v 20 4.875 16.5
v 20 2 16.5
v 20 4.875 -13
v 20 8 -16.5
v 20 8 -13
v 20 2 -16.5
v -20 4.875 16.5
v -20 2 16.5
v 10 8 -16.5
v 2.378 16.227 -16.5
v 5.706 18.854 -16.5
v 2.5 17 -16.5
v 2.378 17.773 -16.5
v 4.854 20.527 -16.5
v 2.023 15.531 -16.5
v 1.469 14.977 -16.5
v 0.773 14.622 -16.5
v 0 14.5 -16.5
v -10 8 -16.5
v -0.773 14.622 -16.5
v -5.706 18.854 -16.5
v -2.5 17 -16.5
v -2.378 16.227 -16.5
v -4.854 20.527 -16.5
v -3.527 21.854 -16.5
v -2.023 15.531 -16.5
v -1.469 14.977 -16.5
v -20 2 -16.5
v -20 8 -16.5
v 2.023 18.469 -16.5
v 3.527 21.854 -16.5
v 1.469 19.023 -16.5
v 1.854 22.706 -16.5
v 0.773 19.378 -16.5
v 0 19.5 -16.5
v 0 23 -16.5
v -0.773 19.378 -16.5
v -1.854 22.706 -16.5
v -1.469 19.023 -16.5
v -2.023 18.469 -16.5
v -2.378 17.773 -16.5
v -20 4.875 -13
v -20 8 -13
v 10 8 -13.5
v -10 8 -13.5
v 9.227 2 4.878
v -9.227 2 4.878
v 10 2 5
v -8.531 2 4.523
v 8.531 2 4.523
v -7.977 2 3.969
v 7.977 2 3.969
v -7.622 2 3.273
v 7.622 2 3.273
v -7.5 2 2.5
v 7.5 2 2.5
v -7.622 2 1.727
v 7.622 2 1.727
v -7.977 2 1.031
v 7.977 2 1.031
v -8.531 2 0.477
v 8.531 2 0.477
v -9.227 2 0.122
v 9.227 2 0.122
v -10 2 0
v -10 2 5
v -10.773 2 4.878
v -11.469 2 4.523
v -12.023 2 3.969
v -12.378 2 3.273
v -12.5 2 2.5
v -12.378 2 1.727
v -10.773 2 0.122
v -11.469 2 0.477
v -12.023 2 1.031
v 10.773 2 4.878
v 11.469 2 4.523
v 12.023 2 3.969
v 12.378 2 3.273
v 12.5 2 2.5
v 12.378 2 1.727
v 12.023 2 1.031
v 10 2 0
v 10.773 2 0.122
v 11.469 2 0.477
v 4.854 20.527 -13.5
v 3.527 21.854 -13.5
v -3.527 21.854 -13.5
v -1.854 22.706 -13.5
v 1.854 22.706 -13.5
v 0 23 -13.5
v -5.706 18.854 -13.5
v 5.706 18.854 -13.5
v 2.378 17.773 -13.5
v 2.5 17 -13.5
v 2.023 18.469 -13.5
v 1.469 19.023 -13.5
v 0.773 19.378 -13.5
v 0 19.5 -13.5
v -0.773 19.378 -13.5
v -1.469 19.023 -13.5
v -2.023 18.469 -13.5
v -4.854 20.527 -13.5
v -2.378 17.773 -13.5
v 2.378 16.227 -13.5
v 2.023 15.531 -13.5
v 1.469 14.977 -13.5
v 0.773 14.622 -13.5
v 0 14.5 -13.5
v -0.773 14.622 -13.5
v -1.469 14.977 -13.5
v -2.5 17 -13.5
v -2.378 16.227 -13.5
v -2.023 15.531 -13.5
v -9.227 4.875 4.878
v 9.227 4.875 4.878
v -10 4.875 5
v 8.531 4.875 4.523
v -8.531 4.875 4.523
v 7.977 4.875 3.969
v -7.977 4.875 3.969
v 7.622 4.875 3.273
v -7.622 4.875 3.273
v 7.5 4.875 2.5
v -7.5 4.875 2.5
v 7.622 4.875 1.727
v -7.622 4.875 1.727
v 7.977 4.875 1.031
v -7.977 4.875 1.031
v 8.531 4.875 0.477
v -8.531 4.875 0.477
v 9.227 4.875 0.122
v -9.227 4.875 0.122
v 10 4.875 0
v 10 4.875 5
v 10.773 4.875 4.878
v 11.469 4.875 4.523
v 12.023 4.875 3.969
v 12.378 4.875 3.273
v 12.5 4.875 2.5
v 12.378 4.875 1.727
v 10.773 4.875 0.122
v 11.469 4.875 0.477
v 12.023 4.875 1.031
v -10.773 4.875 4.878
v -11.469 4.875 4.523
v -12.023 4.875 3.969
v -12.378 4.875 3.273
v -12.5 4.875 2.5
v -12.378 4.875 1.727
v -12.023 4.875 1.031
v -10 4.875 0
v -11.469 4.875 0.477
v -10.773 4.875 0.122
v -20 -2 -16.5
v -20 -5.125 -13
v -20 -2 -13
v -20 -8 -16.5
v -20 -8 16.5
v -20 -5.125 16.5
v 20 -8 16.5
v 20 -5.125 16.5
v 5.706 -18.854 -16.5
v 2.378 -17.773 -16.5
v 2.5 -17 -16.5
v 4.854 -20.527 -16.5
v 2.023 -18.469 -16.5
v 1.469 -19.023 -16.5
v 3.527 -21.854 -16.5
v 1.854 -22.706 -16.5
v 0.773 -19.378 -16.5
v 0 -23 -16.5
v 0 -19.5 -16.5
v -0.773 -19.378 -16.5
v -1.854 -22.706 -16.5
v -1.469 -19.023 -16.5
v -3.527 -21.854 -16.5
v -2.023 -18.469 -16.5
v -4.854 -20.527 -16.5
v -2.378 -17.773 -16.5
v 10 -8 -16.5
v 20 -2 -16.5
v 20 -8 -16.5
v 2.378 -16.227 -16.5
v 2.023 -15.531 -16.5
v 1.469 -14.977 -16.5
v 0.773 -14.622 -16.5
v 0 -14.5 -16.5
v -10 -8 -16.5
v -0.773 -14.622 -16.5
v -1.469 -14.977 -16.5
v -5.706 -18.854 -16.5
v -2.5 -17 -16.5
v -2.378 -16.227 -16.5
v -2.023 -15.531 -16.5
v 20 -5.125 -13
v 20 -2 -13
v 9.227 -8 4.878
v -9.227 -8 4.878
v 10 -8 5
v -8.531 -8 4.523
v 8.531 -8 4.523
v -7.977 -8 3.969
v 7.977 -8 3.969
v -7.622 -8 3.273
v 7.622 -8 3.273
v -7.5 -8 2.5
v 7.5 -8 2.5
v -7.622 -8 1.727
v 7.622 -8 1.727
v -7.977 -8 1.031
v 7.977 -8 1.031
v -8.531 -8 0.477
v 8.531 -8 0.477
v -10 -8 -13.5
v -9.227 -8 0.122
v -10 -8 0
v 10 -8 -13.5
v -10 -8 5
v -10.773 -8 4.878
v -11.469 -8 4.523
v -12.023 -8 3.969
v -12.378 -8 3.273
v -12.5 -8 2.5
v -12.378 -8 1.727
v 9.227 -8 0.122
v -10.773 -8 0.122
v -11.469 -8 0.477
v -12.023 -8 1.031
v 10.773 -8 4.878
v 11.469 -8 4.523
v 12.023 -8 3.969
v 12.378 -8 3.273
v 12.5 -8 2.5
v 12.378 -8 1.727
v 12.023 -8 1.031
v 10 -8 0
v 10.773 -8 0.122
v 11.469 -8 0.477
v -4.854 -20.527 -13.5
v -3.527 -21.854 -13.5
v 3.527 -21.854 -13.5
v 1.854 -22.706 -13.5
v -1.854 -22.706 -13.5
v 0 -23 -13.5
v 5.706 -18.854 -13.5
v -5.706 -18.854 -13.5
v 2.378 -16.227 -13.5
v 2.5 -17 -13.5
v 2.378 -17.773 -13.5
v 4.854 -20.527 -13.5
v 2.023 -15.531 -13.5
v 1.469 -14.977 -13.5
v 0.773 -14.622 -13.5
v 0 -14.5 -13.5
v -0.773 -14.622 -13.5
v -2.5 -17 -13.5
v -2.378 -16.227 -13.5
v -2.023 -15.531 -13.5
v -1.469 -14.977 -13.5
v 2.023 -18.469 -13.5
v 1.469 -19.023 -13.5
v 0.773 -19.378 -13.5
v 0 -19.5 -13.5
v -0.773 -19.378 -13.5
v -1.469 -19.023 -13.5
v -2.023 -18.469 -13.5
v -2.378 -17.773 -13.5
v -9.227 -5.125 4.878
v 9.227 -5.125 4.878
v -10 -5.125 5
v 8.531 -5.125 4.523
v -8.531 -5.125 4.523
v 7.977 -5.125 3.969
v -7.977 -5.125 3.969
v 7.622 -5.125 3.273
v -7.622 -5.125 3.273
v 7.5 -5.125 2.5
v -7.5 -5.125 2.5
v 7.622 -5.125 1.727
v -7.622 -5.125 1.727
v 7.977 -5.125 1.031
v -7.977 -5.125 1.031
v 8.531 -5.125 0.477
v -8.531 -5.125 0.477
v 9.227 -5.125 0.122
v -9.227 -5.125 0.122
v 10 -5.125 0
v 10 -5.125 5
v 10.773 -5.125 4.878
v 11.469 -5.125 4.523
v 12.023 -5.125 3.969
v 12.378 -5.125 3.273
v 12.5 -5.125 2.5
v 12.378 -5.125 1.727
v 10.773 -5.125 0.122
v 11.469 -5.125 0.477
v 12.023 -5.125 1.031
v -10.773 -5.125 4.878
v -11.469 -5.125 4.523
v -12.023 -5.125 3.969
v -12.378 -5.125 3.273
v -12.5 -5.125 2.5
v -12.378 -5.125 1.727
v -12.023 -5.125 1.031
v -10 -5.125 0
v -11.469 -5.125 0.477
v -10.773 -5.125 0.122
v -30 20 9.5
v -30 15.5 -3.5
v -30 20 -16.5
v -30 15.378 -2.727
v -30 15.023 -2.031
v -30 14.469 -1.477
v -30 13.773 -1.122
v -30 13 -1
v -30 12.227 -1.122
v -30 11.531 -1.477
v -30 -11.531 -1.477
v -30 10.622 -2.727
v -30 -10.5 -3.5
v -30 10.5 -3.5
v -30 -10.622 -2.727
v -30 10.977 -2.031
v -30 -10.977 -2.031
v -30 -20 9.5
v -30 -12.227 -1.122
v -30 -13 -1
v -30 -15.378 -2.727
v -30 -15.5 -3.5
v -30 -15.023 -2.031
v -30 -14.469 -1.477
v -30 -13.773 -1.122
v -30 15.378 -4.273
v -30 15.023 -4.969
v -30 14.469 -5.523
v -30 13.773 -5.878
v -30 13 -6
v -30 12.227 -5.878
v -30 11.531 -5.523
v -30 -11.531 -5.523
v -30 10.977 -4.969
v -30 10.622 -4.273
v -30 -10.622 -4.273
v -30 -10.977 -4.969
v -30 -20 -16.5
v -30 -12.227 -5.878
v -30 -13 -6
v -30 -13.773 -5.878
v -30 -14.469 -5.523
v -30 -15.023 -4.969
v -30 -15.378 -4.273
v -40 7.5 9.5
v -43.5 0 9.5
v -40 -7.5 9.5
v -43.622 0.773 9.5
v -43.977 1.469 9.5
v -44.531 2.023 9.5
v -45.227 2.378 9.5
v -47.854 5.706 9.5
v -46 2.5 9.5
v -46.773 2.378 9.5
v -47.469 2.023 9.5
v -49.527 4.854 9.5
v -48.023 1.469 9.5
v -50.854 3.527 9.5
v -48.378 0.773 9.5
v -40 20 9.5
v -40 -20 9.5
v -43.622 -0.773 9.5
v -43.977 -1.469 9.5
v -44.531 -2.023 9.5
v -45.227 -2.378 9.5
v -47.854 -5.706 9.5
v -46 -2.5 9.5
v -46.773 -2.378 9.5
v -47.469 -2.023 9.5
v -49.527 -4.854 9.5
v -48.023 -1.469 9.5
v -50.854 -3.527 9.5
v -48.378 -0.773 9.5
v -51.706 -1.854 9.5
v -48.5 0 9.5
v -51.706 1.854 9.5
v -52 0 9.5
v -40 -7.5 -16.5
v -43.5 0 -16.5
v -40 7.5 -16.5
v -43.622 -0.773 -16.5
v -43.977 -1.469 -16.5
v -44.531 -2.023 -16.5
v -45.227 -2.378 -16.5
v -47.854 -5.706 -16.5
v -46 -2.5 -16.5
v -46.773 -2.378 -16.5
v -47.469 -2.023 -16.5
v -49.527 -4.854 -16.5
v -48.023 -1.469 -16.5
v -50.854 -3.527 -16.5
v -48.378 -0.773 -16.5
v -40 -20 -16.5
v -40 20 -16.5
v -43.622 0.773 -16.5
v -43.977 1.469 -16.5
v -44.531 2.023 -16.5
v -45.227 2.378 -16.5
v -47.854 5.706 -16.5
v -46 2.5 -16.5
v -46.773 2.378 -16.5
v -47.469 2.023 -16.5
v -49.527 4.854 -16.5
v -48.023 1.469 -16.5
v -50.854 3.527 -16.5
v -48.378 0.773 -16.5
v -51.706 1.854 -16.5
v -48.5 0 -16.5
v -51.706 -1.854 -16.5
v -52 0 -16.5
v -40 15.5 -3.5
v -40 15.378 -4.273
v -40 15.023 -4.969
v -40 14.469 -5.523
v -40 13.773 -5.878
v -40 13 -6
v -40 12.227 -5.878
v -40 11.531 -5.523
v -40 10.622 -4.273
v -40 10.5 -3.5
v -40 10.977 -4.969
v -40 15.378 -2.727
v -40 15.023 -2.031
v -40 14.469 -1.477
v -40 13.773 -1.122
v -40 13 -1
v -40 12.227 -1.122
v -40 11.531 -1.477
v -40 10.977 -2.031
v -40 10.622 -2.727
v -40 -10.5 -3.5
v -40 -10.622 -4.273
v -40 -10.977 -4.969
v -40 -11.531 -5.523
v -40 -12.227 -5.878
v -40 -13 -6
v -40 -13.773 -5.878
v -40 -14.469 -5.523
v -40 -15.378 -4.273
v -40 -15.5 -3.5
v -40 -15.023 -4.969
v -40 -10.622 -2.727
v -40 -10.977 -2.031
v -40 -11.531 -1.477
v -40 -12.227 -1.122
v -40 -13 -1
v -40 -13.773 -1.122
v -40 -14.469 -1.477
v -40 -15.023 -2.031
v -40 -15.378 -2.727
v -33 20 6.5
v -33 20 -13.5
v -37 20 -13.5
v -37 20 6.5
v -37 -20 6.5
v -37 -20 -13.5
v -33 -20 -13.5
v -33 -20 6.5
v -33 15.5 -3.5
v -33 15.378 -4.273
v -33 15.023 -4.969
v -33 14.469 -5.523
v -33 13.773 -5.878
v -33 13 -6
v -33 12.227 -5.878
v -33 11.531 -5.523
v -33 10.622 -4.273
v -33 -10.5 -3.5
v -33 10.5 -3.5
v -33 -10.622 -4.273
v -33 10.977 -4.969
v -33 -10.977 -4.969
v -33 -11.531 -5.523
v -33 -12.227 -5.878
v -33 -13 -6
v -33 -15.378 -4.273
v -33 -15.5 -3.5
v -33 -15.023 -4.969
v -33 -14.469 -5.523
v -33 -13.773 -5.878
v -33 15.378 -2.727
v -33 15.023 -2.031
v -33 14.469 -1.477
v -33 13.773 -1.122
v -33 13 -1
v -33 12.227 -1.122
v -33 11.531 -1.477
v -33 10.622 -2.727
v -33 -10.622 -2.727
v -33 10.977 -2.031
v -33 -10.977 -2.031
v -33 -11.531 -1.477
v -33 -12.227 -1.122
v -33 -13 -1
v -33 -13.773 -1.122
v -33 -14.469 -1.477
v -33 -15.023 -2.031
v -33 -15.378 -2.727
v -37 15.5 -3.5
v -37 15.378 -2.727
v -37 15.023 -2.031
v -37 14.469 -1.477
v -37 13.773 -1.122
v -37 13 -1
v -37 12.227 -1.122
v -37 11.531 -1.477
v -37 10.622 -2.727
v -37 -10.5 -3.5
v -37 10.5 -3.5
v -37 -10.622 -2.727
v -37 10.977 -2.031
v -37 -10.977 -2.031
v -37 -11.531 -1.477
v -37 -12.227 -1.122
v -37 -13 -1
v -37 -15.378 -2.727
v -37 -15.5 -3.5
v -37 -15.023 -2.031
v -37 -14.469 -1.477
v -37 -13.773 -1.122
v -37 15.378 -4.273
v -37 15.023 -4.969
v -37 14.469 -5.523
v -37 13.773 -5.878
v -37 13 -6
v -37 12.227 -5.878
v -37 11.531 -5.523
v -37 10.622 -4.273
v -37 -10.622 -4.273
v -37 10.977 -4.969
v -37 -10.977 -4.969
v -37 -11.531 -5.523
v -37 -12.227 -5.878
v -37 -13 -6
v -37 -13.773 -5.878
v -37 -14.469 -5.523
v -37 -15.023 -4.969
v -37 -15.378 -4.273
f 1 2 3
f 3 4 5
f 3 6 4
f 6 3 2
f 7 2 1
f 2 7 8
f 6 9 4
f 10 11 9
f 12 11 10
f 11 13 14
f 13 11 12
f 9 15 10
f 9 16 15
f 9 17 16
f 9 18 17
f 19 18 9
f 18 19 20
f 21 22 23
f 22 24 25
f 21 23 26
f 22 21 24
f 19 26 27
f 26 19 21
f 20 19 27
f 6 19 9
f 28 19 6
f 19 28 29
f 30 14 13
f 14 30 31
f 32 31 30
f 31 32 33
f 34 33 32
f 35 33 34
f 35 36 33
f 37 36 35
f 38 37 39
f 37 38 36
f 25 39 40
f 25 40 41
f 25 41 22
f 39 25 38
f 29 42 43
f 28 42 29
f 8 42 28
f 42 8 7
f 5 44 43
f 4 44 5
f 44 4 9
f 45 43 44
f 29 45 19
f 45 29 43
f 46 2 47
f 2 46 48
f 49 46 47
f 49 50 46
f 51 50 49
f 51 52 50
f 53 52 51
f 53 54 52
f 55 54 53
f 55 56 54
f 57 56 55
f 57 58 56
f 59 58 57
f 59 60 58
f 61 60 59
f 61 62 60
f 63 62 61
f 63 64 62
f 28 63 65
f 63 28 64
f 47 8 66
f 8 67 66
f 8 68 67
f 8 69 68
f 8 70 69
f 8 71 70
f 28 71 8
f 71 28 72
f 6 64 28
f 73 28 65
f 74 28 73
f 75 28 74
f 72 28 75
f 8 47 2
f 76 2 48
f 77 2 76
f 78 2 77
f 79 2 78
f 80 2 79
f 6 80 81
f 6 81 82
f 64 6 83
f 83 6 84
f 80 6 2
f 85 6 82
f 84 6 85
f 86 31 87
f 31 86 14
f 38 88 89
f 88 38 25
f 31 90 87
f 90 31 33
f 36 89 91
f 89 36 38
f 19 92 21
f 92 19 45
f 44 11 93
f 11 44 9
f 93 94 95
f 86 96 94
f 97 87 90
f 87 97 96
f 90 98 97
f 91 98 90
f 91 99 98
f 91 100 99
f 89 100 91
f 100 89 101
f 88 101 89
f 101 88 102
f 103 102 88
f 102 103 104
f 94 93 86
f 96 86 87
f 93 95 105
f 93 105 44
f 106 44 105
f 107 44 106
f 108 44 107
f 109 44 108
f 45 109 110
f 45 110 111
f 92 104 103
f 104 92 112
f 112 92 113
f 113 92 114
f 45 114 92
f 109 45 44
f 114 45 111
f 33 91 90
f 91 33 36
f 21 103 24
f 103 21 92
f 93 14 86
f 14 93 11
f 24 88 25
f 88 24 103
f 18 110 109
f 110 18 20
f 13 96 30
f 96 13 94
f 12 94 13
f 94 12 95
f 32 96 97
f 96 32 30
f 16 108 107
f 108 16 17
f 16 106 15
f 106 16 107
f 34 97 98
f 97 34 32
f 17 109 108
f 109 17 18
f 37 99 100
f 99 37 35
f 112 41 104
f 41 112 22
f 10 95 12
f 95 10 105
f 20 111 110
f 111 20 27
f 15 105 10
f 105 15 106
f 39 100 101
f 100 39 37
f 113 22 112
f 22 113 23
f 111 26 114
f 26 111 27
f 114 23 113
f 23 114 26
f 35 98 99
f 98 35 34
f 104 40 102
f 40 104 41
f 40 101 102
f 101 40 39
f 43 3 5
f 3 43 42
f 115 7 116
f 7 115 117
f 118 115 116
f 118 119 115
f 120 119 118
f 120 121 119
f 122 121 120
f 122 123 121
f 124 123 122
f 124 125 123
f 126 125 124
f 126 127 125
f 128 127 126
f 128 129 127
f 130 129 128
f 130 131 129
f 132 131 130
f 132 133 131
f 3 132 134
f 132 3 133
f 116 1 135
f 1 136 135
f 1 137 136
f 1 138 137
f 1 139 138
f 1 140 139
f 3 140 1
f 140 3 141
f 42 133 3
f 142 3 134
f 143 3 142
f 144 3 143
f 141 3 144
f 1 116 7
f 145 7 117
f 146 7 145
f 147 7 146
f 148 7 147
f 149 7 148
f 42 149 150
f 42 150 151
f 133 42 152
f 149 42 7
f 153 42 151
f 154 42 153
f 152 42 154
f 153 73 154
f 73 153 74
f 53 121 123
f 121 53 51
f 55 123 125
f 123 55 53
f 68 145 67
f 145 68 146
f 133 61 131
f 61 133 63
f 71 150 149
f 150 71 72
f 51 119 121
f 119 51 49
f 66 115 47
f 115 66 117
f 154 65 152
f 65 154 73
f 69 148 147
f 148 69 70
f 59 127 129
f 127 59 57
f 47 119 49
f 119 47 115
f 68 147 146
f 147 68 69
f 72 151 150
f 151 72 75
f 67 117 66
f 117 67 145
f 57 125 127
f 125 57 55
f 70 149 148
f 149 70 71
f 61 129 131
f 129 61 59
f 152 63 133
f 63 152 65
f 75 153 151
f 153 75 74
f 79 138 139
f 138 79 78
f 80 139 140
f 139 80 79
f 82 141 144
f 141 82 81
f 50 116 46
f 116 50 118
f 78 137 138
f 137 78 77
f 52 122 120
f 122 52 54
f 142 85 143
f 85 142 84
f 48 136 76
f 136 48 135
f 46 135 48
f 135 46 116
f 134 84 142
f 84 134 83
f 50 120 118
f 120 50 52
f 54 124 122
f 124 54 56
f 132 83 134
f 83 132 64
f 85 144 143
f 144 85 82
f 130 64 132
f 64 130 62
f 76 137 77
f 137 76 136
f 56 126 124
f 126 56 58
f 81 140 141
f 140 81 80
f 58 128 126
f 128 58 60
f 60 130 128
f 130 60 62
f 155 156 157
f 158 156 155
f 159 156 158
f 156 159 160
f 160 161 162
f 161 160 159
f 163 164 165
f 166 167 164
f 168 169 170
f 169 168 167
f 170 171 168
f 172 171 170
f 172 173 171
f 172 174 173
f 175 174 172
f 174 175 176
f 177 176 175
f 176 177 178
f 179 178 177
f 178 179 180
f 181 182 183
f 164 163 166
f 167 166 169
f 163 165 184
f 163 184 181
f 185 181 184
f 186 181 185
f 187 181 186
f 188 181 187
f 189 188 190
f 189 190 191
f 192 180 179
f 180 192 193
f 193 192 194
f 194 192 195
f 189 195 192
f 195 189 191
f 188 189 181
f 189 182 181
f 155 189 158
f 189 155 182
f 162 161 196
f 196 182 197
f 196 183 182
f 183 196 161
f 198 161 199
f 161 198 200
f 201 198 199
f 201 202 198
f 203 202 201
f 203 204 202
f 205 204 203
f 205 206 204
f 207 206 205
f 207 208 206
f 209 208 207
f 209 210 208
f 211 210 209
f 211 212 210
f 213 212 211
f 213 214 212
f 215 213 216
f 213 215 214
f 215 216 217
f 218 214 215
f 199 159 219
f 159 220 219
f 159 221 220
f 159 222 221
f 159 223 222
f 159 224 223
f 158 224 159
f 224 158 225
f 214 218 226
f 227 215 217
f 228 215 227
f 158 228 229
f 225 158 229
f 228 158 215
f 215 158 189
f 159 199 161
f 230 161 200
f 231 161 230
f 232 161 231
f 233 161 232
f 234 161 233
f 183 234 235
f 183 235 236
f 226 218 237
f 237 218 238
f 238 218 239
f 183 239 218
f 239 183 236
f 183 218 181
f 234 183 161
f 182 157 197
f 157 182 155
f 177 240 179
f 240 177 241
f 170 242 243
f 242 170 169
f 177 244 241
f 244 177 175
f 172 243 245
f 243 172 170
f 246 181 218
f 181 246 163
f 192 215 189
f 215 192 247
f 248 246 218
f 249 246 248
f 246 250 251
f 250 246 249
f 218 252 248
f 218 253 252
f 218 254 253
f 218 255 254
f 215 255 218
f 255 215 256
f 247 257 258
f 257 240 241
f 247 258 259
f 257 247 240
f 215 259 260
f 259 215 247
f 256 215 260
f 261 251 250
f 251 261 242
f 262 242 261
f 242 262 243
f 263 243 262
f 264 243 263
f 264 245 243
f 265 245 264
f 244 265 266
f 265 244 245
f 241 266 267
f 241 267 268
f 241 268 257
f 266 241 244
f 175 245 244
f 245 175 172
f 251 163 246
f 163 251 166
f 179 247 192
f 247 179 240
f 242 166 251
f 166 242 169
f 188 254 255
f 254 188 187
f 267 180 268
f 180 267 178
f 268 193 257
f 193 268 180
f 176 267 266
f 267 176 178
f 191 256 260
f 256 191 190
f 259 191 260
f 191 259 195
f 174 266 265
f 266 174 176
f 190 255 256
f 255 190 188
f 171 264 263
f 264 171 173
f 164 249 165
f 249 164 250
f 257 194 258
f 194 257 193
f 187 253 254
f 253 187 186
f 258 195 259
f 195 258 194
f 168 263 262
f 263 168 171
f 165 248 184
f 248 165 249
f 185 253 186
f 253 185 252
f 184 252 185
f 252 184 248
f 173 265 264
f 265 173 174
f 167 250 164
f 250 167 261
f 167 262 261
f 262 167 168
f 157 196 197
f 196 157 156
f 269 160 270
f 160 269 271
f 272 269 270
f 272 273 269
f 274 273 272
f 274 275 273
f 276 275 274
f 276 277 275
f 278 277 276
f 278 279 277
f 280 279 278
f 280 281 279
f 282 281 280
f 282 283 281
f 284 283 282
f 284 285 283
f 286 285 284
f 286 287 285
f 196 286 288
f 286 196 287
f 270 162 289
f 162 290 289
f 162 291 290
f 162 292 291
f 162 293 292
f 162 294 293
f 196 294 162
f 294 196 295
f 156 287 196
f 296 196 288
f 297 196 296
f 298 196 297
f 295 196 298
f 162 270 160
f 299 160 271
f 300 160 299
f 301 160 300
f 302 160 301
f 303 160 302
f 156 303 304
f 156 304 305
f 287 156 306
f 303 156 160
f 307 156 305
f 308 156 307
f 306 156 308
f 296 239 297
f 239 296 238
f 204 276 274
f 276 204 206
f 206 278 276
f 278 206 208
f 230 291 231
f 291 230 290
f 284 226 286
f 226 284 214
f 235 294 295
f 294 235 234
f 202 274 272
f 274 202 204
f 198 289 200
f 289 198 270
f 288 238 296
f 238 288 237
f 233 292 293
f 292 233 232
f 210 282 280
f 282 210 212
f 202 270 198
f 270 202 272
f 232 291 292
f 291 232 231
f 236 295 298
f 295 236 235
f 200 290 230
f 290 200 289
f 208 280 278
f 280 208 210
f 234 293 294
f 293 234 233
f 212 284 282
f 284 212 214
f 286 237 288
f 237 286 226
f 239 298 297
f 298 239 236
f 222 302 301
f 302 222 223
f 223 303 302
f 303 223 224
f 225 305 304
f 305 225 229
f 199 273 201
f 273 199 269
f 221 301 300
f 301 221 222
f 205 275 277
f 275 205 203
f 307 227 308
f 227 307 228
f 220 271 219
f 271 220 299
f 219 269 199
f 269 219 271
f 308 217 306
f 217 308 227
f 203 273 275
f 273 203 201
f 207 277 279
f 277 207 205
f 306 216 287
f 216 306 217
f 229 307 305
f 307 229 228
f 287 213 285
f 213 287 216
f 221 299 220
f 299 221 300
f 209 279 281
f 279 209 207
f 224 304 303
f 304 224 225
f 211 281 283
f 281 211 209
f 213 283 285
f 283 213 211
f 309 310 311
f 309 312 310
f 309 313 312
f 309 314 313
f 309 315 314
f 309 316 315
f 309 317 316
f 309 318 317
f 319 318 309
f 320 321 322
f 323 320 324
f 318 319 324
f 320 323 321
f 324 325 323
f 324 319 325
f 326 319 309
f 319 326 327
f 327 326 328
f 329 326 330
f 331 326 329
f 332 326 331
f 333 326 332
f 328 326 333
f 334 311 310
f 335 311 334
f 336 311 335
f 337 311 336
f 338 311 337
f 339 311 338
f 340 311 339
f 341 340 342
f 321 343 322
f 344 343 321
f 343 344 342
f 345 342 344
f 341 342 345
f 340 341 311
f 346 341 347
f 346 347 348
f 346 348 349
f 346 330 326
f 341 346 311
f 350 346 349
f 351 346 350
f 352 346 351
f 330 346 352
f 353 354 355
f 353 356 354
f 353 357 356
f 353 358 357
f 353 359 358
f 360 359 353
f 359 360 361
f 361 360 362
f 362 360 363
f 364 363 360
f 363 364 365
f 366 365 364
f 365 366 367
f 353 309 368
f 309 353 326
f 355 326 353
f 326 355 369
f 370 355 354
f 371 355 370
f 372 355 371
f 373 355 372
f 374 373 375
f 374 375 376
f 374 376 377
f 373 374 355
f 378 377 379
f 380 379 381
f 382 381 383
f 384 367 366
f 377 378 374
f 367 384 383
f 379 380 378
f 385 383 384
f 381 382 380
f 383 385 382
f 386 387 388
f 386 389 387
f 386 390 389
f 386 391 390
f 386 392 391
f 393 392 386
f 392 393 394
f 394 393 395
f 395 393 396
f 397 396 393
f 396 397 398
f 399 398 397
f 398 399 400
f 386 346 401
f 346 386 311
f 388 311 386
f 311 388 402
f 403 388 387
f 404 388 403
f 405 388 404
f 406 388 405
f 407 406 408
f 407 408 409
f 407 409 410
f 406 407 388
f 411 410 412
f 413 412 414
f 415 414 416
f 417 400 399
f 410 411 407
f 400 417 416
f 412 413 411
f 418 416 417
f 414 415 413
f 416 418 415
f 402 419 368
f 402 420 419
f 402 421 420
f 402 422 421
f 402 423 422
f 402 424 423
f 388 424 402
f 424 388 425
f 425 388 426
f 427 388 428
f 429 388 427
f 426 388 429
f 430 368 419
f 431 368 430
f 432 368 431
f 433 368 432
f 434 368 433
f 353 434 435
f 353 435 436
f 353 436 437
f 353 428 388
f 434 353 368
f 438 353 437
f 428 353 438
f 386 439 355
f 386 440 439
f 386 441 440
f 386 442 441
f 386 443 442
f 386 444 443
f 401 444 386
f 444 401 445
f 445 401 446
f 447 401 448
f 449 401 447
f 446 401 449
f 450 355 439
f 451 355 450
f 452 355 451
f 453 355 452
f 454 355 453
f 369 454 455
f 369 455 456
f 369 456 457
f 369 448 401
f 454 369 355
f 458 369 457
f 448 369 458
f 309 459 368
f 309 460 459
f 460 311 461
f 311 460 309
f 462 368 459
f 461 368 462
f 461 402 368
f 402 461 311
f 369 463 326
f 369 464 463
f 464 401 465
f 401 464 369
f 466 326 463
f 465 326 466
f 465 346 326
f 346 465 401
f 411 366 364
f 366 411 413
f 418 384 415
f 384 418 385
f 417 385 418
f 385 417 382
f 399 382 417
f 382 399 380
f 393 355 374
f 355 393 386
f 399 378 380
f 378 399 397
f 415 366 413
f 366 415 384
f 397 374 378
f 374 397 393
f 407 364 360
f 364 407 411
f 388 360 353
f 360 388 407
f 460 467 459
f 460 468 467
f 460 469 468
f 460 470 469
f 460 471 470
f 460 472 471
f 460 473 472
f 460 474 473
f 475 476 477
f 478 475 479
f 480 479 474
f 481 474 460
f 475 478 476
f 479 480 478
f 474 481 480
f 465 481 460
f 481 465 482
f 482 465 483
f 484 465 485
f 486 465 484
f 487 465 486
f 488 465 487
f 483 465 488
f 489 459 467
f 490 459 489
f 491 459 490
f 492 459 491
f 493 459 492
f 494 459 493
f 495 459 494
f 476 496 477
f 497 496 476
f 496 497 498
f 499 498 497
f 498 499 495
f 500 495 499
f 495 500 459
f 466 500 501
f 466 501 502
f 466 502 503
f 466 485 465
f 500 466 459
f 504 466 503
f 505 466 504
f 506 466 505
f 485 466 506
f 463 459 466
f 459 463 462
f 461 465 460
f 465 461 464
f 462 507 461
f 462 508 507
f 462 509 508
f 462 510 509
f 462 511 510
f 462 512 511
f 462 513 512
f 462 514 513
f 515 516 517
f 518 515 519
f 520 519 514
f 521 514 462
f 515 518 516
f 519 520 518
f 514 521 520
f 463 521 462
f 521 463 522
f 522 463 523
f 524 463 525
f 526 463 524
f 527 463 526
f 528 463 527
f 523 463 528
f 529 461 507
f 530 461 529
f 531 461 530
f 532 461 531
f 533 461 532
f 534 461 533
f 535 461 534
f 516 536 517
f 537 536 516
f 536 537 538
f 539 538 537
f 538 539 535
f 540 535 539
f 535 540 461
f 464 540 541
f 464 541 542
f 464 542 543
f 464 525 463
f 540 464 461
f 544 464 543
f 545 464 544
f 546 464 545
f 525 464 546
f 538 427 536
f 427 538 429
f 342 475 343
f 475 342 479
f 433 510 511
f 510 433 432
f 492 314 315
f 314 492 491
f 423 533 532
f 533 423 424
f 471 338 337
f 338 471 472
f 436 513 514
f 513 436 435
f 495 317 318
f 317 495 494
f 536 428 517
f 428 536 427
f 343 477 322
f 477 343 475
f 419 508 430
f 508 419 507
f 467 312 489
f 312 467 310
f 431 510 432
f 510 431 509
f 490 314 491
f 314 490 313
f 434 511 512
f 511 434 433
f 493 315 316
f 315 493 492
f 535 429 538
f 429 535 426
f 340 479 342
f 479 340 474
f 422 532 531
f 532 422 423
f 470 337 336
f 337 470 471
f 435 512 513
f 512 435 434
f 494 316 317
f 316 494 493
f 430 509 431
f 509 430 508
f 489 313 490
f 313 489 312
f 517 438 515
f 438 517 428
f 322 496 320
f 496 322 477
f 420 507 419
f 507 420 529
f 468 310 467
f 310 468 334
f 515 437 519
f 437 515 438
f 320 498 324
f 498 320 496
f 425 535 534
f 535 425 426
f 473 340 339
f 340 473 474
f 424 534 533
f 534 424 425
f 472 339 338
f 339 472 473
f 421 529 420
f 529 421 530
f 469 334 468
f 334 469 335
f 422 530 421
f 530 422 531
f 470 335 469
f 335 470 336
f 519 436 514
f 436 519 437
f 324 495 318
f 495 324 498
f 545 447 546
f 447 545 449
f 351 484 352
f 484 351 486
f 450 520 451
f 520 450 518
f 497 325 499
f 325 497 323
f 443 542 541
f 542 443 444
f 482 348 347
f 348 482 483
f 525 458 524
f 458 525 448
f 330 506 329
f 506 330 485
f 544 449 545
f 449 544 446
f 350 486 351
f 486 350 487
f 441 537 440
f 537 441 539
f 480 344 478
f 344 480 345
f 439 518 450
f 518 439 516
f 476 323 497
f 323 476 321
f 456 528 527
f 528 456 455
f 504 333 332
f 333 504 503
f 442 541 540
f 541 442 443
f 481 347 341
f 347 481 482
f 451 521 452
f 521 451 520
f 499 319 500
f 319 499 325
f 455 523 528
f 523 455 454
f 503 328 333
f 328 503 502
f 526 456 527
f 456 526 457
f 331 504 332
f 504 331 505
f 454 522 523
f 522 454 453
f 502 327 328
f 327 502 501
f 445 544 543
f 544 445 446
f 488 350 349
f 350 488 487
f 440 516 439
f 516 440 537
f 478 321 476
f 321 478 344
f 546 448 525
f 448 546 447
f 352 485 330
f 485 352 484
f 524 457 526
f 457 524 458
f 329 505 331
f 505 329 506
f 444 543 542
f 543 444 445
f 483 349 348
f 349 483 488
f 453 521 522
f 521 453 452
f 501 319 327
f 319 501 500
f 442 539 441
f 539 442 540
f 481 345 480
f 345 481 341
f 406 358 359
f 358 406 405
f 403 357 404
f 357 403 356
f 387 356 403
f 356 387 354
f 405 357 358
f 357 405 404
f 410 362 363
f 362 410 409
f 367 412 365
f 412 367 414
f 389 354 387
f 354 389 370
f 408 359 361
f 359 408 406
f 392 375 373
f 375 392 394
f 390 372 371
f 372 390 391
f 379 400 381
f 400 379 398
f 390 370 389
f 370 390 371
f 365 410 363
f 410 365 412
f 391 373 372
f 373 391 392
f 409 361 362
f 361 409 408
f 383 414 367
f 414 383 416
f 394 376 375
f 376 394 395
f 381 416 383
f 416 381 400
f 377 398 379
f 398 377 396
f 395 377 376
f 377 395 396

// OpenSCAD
// [FL_INDEX: keywords="openscad, 3d_parametric, Pedal_Mod_for_Grand_Piano_part_2_of_2_-_Rocker_Hinge, csg_solid" | COT="Parametric OpenSCAD design from 3DCodeverse"]
// Title: Pedal Mod for Grand Piano part 2 of 2 - Rocker Hinge

//Width of the metal bar in mm
BarWidth=19;

//Thickness of the metal bar in mm
BarThickness=3;

/*[hidden]*/

/*
Use 4mm diameter nuts and bolts for all attachments! 4mm diameter screws also.
*/

$fn=20;

//1st half of the rocker-hinge mount bracket
translate([0,5,0])
difference(){

union(){
	//bottom plate
	cube([40,6,BarWidth+14],center=true);

	//structure for axle hole
	hull(){
		translate([0,12,-(((BarWidth+14)/2)-1.5)])cylinder(r=6,h=3,center=true);
		translate([0,2,-(((BarWidth+14)/2)-1.5)])cube([20,2,3],center=true);
	}
}

	//axle hole
	translate([0,12,-(((BarWidth+14)/2)-1.5)])cylinder(r=2.5,h=4,center=true);
	
	//cut-away for other half
	translate([0,3,3.5])cube([42,6.25,BarWidth+14],center=true);

	//screw holes
	translate([-10,0,2.5])rotate([90,0,0])cylinder(r=2.5,h=10,center=true);
	translate([10,0,2.5])rotate([90,0,0])cylinder(r=2.5,h=10,center=true);

}


//2nd half of the rocker-hinge mount bracket
rotate([0,0,180])
translate([0,5,0])
difference(){

union(){
	//bottom plate
	cube([40,6,BarWidth+14],center=true);

	//structure for axle hole
	hull(){
		translate([0,12,-(((BarWidth+14)/2)-1.5)])cylinder(r=6,h=3,center=true);
		translate([0,2,-(((BarWidth+14)/2)-1.5)])cube([20,2,3],center=true);
	}
}

	//axle hole
	translate([0,12,-(((BarWidth+14)/2)-1.5)])cylinder(r=2.5,h=4,center=true);
	
	//cut-away for other half
	translate([0,-3,3.5])cube([42,6.25,BarWidth+14],center=true);

	//screw holes
	translate([-10,0,2.5])rotate([90,0,0])cylinder(r=2.5,h=10,center=true);
	translate([10,0,2.5])rotate([90,0,0])cylinder(r=2.5,h=10,center=true);

}


//Rocker hinge that slides over bar

difference(){
	//main geometry
	union(){
		translate([-35,0,-(((BarWidth+14)/2)-13)])
		cube([BarThickness+7,40,BarWidth+7],center=true);
		hull(){
			translate([-35-(((BarThickness+7)/2)+6),0,-(((BarWidth+14)/2)-13)])
			cylinder(r=6,h=BarWidth+7,center=true);
			translate([-35-(((BarThickness+7)/2)-1.5),0,-(((BarWidth+14)/2)-13)])
			cube([3,15,BarWidth+7],center=true);
		}
	}

	//hole for bar
	translate([-35,0,-(((BarWidth+14)/2)-13)])
	cube([BarThickness+1,42,BarWidth+1],center=true);

	//holes for bolts
	translate([-35,13,-(((BarWidth+14)/2)-13)])rotate([0,90,0])
	cylinder(r=2.5,h=BarThickness+10,center=true);
	
	translate([-35,-13,-(((BarWidth+14)/2)-13)])rotate([0,90,0])
	cylinder(r=2.5,h=BarThickness+10,center=true);

	//hole for axle
	translate([-35-(((BarThickness+7)/2)+6),0,-(((BarWidth+14)/2)-13)])
	cylinder(r=2.5,h=BarWidth+9,center=true);
}
